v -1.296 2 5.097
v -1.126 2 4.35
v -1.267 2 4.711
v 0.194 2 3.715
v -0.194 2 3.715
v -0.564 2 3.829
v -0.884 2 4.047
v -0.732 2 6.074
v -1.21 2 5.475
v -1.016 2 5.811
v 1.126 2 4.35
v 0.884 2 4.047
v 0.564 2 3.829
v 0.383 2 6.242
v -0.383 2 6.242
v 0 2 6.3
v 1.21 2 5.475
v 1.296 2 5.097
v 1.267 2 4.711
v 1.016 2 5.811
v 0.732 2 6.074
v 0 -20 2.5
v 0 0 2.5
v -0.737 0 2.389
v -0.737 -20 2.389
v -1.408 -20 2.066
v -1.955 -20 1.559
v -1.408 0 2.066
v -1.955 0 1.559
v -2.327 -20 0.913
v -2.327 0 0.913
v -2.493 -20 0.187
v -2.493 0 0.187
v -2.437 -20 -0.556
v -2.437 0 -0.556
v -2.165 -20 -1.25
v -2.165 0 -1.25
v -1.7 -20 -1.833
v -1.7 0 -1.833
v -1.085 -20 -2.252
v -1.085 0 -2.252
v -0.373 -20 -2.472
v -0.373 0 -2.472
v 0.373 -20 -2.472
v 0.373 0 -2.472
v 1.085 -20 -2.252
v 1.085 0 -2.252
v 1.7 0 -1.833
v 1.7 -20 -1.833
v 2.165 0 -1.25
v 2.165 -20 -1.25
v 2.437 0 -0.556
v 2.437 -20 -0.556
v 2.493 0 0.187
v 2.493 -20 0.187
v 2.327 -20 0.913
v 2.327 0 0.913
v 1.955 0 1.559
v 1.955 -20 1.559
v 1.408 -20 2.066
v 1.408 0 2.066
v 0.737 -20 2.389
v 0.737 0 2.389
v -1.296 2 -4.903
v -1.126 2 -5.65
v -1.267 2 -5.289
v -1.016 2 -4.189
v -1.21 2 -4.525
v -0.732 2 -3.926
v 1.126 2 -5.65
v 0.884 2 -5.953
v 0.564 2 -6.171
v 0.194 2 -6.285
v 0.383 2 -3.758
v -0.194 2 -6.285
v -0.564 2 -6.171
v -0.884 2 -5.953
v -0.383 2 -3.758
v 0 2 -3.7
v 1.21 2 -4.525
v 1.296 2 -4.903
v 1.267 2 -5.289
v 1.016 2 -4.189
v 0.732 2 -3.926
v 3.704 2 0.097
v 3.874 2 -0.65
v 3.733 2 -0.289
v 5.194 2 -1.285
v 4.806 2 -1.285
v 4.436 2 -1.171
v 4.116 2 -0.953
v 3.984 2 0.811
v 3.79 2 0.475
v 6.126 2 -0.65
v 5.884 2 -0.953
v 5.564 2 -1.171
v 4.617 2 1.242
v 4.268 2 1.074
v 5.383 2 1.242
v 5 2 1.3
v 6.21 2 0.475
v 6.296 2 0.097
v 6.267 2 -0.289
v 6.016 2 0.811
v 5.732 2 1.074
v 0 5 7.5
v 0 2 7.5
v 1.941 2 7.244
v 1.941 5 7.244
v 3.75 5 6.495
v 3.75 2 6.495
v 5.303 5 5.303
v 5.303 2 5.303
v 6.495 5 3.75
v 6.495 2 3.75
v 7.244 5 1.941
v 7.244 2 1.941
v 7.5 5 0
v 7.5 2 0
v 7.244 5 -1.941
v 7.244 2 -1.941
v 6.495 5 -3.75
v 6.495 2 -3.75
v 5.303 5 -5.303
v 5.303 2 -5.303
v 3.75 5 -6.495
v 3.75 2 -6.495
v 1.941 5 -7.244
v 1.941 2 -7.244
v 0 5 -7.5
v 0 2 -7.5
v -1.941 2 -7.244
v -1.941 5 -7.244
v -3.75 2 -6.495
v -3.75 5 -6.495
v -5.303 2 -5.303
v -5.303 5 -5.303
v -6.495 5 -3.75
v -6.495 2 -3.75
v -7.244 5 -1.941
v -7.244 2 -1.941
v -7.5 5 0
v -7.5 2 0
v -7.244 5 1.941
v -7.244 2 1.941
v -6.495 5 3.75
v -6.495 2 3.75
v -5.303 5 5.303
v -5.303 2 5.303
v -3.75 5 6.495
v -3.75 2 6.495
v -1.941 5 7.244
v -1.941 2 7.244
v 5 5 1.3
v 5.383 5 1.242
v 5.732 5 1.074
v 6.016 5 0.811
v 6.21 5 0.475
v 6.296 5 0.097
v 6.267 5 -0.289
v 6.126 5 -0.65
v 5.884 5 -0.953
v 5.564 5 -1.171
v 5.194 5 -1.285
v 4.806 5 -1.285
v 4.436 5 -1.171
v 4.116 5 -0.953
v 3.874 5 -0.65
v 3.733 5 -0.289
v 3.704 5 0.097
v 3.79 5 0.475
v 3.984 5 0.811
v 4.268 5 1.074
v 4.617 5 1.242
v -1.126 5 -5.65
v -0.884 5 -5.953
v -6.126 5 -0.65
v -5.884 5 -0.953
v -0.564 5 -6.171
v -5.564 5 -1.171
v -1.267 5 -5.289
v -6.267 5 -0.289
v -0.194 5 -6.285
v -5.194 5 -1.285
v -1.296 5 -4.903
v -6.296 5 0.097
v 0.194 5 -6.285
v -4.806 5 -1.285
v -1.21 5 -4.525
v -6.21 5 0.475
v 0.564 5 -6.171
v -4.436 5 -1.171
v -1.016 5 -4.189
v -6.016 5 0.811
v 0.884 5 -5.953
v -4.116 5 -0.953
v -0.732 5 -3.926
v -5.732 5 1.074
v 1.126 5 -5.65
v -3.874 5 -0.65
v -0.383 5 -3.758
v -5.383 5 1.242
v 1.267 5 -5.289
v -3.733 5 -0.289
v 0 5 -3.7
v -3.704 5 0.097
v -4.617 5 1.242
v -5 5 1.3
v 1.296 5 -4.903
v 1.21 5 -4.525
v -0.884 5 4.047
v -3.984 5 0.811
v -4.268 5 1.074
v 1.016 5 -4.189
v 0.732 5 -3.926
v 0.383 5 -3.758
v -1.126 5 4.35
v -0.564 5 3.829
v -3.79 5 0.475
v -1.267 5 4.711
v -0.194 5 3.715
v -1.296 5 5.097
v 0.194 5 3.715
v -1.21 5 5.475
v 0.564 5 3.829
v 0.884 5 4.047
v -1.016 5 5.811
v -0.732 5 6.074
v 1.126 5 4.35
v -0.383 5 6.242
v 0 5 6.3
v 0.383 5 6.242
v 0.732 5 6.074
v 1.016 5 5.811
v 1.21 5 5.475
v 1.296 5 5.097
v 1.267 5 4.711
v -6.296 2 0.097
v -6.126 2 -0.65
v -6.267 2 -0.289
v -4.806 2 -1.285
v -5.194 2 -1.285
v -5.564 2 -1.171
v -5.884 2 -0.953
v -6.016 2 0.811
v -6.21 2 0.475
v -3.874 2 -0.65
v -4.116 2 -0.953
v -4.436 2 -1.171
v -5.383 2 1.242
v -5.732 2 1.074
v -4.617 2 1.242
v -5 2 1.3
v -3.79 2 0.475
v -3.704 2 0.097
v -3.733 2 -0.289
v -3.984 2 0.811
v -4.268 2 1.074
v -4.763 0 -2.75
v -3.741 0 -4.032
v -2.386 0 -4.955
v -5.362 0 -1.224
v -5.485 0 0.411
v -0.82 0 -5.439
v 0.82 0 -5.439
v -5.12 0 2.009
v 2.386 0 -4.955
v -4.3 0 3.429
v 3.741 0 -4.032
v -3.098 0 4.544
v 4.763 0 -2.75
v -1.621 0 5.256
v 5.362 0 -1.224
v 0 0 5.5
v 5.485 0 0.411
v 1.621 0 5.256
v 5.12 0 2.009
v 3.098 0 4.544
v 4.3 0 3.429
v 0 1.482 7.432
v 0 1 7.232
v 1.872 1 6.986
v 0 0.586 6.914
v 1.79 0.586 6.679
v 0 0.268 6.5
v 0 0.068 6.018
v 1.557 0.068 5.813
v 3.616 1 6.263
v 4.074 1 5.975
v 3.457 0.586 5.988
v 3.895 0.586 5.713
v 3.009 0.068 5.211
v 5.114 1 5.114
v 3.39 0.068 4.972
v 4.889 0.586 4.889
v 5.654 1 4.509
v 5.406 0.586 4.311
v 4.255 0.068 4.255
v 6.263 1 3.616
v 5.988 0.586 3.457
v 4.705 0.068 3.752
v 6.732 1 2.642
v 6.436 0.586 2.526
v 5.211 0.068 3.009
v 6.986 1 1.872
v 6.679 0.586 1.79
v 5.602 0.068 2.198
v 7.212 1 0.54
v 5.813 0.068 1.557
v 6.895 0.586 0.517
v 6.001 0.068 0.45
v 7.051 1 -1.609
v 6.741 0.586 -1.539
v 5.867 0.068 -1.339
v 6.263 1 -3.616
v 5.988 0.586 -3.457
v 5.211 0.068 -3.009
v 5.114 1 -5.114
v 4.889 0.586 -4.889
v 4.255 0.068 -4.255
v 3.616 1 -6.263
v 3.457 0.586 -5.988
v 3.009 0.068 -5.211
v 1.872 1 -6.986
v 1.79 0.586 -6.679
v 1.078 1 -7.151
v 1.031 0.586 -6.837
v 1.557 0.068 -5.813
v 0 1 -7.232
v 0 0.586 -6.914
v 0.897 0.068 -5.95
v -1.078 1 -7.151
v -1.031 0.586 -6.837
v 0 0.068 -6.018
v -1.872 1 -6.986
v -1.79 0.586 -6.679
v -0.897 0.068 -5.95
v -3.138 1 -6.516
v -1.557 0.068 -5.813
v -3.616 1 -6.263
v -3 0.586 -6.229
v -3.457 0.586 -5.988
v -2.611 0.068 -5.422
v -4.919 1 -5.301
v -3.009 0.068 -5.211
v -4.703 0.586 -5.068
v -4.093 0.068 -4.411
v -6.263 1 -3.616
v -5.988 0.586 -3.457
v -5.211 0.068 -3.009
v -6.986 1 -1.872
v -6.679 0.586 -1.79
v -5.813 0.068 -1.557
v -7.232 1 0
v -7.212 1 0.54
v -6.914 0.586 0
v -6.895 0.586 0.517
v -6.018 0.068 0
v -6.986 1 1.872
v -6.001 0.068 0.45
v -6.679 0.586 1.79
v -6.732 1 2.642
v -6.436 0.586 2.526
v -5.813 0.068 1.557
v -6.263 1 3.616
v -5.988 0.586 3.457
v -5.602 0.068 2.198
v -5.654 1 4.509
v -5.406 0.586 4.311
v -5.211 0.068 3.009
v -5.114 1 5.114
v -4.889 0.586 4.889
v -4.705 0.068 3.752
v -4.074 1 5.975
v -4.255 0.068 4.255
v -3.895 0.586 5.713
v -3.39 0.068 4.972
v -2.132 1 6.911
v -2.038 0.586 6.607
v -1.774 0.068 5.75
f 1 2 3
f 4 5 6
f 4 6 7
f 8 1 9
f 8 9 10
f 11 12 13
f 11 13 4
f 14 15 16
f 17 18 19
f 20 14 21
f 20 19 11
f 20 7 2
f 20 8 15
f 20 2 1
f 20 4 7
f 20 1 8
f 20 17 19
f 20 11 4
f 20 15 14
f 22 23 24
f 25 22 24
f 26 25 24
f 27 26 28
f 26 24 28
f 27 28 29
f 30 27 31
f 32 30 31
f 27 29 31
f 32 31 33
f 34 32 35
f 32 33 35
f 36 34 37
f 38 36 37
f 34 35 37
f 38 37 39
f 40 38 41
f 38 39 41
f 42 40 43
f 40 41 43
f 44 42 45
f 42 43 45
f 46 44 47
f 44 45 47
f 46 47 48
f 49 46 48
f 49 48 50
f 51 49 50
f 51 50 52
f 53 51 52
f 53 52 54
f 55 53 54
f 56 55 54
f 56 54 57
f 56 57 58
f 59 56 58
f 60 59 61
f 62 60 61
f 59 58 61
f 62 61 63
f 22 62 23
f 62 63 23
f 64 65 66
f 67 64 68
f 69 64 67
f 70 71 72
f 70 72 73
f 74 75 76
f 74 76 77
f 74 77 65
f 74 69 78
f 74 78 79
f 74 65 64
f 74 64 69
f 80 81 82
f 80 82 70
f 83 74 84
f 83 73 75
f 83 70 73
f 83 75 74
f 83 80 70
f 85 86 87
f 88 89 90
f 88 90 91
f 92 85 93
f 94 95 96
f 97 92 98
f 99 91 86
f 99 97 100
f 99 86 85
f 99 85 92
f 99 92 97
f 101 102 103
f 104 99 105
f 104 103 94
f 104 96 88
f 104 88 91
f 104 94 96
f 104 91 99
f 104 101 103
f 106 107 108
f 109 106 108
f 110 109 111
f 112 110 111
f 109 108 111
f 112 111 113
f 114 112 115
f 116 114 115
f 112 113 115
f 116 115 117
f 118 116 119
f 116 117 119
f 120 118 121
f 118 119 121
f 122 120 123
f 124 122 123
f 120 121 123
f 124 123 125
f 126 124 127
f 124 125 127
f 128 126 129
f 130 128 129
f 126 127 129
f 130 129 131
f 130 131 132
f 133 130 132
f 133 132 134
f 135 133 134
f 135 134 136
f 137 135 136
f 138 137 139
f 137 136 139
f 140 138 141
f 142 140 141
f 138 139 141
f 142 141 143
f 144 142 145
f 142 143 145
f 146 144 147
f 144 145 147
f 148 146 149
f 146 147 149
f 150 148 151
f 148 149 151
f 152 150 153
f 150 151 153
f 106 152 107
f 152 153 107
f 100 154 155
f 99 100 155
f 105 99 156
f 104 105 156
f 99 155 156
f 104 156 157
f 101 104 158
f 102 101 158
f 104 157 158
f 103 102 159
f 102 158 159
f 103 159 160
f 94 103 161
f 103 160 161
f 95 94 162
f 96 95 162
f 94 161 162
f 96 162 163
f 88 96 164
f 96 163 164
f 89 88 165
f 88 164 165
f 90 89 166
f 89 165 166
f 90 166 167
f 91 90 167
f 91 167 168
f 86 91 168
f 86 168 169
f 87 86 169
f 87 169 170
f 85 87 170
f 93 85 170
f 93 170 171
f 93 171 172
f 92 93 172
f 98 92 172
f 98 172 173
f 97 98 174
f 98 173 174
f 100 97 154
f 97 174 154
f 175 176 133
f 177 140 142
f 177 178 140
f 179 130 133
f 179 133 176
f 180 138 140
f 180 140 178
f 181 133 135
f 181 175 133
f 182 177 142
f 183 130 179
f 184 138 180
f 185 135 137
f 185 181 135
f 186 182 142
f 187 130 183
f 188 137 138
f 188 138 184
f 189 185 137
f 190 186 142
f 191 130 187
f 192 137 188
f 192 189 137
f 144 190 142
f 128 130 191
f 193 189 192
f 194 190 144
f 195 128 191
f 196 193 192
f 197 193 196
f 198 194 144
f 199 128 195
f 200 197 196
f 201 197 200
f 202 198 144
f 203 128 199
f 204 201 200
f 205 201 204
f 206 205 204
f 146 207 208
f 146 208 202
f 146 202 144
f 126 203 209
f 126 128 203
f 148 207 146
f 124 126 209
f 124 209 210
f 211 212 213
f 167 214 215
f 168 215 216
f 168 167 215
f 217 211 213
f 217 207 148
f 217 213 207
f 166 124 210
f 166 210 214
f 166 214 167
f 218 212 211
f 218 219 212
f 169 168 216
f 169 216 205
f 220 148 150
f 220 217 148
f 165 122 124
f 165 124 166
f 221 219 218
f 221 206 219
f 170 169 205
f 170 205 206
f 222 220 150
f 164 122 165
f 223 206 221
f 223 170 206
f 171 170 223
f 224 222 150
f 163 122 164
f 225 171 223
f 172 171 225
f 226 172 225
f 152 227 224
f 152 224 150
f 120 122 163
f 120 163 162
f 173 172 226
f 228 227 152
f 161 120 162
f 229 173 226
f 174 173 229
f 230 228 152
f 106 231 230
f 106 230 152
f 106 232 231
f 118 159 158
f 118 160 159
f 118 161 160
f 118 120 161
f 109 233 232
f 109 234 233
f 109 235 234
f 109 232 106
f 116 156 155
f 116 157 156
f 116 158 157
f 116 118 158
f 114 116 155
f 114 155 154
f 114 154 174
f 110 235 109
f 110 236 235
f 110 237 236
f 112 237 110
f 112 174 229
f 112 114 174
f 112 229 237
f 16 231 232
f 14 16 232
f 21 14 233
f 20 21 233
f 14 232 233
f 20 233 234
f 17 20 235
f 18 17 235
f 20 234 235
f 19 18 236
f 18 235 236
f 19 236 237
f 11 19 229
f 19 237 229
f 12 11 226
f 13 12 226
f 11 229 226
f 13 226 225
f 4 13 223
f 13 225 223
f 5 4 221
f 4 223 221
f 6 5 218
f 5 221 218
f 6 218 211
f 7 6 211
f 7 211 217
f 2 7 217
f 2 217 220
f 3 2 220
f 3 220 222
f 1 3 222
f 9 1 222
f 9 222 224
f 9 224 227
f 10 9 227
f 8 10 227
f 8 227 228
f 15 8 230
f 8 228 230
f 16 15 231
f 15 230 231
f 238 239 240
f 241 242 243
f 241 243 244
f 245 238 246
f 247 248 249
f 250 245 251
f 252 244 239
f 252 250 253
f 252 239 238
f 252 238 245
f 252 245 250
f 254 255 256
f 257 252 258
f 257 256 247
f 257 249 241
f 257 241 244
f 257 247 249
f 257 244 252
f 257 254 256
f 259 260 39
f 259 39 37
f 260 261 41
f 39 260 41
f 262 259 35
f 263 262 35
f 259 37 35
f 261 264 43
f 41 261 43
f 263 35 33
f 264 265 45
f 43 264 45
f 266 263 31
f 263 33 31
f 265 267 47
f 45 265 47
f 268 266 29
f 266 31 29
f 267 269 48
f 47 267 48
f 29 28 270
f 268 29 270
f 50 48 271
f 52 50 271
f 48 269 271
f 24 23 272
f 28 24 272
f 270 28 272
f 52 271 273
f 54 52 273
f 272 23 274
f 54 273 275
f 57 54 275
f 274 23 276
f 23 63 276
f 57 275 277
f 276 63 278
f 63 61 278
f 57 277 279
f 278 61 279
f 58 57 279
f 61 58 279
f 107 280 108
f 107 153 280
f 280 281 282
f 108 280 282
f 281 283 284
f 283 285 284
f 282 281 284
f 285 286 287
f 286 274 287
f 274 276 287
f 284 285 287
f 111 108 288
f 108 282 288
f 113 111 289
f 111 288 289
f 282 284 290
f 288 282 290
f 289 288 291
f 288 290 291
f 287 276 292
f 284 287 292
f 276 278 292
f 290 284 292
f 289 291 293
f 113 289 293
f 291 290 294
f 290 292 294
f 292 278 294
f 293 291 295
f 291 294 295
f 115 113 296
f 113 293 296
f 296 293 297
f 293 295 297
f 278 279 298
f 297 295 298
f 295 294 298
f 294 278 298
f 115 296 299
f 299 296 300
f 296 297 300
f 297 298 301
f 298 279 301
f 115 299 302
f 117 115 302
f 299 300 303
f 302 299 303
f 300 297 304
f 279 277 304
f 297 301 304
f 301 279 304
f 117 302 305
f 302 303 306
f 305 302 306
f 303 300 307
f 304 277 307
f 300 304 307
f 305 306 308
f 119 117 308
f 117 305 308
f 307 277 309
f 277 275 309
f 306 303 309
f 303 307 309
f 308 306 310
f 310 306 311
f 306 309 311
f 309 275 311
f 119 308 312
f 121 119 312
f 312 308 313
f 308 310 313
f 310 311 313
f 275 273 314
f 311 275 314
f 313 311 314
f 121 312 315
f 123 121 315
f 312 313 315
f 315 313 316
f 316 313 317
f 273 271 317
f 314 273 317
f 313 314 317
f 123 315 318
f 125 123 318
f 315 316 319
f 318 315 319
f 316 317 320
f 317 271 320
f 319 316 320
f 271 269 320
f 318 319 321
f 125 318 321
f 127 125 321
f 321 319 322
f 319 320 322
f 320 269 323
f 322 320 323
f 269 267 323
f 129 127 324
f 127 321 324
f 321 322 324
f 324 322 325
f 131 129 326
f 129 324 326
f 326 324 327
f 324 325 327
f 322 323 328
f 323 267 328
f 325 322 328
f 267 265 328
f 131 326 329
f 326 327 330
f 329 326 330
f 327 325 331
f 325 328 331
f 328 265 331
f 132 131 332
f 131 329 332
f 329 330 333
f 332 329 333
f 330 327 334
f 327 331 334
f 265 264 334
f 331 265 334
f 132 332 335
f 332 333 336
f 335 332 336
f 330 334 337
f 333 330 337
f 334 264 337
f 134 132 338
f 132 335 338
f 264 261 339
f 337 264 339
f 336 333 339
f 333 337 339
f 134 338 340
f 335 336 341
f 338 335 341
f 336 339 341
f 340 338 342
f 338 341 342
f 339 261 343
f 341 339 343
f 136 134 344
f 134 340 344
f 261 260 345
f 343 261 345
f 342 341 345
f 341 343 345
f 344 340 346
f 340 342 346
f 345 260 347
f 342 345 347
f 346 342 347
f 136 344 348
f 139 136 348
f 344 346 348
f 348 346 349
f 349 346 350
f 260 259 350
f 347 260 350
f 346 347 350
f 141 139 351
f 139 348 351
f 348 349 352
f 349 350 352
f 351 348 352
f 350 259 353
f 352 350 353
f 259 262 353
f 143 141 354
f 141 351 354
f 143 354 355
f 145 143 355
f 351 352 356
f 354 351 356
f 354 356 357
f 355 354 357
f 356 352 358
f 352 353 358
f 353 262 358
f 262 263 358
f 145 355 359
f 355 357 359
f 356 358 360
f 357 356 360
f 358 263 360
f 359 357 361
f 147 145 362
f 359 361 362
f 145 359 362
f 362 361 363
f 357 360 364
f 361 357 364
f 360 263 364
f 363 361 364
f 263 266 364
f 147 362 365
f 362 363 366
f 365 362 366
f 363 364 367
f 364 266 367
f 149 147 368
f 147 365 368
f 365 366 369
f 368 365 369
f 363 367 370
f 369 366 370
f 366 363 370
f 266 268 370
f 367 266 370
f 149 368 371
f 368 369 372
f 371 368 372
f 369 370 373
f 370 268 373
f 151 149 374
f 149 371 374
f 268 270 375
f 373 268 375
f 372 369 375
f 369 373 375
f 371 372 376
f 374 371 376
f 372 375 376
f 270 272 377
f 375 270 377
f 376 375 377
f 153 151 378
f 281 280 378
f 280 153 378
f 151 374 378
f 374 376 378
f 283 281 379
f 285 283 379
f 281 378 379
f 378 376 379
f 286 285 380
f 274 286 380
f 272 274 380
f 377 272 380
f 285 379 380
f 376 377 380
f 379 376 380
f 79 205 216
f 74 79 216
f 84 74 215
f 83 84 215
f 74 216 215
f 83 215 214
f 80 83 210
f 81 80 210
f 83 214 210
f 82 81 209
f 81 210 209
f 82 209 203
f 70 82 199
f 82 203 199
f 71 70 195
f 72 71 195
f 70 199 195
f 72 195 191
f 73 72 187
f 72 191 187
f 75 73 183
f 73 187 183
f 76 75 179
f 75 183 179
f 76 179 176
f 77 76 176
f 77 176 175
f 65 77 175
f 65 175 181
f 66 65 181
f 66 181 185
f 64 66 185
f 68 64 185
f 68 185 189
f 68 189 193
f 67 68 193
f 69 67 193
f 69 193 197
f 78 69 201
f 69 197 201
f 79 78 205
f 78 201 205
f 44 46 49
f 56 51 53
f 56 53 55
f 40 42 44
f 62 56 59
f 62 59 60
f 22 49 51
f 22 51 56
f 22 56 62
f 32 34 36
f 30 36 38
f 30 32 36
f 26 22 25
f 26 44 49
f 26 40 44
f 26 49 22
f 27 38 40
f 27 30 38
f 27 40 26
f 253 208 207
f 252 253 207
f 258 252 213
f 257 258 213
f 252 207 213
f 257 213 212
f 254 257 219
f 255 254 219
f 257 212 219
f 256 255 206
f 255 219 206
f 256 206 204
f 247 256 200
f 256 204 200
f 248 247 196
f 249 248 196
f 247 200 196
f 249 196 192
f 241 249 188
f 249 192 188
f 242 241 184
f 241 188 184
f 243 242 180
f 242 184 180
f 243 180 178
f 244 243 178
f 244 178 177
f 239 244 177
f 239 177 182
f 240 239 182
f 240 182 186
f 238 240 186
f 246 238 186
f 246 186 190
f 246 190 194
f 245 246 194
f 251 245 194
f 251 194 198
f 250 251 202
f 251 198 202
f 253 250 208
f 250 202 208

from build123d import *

# Parameters (mm, degrees)
SKETCH1_R           = 7.5
BOSS_EXTRUDE1_DEPTH = 5
SKETCH2_R           = 1.3
CUT_EXTRUDE1_DEPTH  = 3
FILLET1_R           = 2
SKETCH3_R           = 2.5
BOSS_EXTRUDE2_DEPTH = 20


with BuildPart() as part:
    # Sketch1 → Boss-Extrude1 (new body)
    with BuildSketch(Plane(origin=(0, 0, 0), x_dir=(1, 0, 0), z_dir=(0, 1, 0))):
        with Locations(Location((0, 0, 0), (0, 0, 270))):
            Circle(SKETCH1_R)
    extrude(amount=BOSS_EXTRUDE1_DEPTH)

    # Sketch2 → Cut-Extrude1 (cut)
    with BuildSketch(Plane(origin=(0, 5, 0), x_dir=(1, 0, 0), z_dir=(0, 1, 0))):
        with Locations(Location((0, 5, 0), (0, 0, 270))):
            Circle(SKETCH2_R)
        with Locations(Location((5, 0, 0), (0, 0, 270))):
            Circle(SKETCH2_R)
        with Locations(Location((0, -5, 0), (0, 0, 270))):
            Circle(SKETCH2_R)
        with Locations(Location((-5, 0, 0), (0, 0, 270))):
            Circle(SKETCH2_R)
    extrude(amount=-CUT_EXTRUDE1_DEPTH, mode=Mode.SUBTRACT)

    # Fillet1
    fillet1_edges = [part.edges().sort_by_distance(p)[0] for p in [
        (0, 0, -7.5),
    ]]
    fillet(fillet1_edges, radius=FILLET1_R)

    # Sketch3 → Boss-Extrude2 (add)
    with BuildSketch(Plane.XZ):
        with Locations(Location((0, 0, 0), (0, 0, 90))):
            Circle(SKETCH3_R)
    extrude(amount=BOSS_EXTRUDE2_DEPTH)


solid = part.part
